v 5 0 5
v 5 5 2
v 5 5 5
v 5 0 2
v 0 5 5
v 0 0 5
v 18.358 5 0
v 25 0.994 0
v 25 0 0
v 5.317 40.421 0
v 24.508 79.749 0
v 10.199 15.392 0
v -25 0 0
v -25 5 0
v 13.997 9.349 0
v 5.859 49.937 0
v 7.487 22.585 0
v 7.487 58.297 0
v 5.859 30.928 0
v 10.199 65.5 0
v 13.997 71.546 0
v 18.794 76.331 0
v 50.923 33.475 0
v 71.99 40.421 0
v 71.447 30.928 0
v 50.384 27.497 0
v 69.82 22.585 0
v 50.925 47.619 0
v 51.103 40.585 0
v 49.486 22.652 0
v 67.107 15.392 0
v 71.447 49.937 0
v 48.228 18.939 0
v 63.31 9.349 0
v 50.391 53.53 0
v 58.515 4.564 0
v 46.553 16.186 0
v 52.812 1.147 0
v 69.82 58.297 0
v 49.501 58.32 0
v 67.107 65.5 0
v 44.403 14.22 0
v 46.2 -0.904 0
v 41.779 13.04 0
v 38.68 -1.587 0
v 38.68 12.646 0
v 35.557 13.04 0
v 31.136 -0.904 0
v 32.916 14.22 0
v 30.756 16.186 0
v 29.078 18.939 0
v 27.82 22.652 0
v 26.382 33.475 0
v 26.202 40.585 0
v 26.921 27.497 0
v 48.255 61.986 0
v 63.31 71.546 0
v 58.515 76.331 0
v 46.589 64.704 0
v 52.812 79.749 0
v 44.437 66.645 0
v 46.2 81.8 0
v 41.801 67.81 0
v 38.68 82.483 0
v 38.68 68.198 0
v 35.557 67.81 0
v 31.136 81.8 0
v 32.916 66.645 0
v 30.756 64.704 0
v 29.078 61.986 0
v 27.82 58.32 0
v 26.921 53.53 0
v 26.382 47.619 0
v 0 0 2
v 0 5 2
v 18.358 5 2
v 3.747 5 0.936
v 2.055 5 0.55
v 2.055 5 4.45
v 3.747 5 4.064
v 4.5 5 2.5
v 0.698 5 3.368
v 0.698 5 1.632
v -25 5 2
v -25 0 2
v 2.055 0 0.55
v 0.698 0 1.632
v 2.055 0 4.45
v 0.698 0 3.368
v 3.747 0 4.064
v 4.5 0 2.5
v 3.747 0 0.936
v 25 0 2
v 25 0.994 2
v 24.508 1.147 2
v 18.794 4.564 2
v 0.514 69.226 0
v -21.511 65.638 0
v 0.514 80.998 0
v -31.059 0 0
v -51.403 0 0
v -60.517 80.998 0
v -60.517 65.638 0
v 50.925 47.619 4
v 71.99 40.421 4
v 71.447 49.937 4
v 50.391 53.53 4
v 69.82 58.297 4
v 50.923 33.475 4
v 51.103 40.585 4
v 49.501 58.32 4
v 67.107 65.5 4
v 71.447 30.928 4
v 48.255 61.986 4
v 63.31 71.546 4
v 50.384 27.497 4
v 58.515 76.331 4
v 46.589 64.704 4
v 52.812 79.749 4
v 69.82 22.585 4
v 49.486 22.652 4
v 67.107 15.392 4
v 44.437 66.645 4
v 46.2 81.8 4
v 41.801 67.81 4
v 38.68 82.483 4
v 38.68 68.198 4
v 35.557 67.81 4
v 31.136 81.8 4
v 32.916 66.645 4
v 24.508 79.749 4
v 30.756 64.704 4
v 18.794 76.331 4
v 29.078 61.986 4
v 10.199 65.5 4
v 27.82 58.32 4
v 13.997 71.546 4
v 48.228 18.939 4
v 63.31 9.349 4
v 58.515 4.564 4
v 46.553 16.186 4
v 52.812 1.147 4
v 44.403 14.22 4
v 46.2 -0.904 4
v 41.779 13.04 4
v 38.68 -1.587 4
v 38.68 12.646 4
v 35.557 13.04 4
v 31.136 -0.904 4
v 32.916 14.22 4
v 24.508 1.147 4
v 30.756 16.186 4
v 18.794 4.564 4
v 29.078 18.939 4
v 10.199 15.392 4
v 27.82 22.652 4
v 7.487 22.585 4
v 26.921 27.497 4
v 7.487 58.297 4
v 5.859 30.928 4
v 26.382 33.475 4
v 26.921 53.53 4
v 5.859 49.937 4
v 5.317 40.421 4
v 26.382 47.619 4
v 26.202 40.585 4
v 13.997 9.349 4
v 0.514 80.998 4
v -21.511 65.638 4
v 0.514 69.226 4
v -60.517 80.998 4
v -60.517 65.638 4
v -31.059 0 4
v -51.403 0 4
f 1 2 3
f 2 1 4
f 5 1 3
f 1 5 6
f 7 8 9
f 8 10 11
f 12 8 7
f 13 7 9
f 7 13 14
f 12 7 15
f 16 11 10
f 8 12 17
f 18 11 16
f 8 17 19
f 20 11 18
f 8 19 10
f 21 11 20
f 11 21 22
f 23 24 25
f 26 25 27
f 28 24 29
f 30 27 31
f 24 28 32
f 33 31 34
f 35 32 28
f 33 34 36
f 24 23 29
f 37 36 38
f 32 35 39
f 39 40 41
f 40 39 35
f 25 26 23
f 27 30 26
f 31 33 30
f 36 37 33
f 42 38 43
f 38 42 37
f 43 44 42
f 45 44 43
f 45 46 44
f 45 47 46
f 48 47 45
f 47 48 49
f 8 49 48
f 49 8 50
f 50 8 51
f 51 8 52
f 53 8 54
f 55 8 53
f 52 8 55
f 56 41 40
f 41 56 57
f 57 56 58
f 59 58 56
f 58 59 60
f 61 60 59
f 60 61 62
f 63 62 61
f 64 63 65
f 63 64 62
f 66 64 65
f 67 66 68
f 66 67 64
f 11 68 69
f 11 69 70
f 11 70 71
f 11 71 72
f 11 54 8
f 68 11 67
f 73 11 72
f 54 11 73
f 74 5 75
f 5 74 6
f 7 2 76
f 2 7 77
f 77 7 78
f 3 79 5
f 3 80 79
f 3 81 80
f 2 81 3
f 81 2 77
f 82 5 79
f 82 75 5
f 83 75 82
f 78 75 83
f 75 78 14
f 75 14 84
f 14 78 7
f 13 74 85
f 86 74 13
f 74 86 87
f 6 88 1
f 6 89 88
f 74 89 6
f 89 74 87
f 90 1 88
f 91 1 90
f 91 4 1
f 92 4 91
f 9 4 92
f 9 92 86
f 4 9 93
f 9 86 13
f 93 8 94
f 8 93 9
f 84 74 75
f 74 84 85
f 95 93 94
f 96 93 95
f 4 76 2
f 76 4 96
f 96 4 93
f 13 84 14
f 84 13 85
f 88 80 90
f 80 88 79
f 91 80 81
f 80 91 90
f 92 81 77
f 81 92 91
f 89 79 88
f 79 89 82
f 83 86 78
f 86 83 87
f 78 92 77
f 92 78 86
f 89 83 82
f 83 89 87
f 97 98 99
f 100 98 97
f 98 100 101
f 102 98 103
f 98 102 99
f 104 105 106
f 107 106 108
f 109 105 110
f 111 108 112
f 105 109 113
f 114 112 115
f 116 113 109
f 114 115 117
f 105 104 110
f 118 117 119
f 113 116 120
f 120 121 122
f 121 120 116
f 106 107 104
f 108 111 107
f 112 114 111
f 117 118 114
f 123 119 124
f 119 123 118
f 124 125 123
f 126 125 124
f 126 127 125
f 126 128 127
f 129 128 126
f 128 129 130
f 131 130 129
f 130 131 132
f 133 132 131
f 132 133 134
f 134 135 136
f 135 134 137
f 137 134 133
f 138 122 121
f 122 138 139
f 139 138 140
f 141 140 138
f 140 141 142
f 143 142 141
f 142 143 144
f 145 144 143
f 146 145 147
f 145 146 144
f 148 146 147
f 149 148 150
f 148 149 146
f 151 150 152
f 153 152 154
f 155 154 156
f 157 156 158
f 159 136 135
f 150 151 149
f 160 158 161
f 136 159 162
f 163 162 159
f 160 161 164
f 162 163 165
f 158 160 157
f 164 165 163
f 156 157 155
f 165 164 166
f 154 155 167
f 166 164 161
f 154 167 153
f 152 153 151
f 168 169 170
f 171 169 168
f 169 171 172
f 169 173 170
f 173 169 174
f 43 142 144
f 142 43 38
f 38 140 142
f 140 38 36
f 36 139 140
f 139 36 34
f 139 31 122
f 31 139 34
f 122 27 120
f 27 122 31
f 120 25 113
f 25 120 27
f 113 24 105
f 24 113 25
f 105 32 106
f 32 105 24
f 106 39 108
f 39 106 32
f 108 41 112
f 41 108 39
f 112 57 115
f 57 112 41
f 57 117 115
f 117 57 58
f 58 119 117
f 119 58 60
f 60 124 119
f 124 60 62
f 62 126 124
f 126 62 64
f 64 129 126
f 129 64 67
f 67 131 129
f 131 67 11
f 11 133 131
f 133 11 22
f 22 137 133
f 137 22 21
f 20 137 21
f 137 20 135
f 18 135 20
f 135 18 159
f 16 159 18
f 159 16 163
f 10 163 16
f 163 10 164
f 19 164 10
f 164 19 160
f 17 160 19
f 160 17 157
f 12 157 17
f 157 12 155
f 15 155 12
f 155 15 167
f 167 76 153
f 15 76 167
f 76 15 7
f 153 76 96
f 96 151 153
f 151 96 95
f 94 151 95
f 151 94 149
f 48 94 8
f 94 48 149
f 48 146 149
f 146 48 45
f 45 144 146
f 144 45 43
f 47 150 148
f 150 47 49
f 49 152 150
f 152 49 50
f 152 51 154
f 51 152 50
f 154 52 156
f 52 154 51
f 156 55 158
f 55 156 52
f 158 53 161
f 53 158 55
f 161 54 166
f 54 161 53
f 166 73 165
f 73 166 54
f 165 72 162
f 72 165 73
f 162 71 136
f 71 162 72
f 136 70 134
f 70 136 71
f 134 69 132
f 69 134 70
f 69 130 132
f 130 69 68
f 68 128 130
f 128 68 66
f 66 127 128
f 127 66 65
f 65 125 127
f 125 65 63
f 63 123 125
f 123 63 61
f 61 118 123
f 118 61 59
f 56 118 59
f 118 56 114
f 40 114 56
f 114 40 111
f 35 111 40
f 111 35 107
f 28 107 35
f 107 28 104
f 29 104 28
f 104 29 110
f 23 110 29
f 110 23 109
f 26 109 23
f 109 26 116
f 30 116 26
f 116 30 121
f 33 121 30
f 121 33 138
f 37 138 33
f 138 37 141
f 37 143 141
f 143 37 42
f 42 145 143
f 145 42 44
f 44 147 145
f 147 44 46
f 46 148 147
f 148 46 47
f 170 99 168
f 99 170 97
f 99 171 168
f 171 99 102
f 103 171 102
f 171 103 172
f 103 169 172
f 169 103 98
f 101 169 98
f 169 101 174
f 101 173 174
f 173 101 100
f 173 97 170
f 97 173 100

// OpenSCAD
//font="Bitstream Vera Sans Bold";
//font="Arial Black";
font="Baskerville:style=Bold";
text_on_flat="70";
text_size=80;
depth=4;
spacing=0.9;

hole_d = 4;
cube_d = 5;
module the_text() {
linear_extrude(height=depth, convexity=4)
    text(text_on_flat, 
         size=text_size,
         font=font,
         halign="center",
         spacing=spacing);
}

module the_bar() {
  cube([50, 5, 0.5*depth]);
  translate([25, 0, 0]) {
      cube(cube_d);
        the_hole();
  }
}

module the_hole() {
   translate([0.5*(hole_d + (cube_d - hole_d)), cube_d, 0.5*(hole_d + (cube_d - hole_d))]) rotate([90, 0, 0]) 
          cylinder(d=hole_d, h=5); 
}
the_text();
difference() {
  translate([-25, 0, 0]) the_bar();
  the_hole();
}
